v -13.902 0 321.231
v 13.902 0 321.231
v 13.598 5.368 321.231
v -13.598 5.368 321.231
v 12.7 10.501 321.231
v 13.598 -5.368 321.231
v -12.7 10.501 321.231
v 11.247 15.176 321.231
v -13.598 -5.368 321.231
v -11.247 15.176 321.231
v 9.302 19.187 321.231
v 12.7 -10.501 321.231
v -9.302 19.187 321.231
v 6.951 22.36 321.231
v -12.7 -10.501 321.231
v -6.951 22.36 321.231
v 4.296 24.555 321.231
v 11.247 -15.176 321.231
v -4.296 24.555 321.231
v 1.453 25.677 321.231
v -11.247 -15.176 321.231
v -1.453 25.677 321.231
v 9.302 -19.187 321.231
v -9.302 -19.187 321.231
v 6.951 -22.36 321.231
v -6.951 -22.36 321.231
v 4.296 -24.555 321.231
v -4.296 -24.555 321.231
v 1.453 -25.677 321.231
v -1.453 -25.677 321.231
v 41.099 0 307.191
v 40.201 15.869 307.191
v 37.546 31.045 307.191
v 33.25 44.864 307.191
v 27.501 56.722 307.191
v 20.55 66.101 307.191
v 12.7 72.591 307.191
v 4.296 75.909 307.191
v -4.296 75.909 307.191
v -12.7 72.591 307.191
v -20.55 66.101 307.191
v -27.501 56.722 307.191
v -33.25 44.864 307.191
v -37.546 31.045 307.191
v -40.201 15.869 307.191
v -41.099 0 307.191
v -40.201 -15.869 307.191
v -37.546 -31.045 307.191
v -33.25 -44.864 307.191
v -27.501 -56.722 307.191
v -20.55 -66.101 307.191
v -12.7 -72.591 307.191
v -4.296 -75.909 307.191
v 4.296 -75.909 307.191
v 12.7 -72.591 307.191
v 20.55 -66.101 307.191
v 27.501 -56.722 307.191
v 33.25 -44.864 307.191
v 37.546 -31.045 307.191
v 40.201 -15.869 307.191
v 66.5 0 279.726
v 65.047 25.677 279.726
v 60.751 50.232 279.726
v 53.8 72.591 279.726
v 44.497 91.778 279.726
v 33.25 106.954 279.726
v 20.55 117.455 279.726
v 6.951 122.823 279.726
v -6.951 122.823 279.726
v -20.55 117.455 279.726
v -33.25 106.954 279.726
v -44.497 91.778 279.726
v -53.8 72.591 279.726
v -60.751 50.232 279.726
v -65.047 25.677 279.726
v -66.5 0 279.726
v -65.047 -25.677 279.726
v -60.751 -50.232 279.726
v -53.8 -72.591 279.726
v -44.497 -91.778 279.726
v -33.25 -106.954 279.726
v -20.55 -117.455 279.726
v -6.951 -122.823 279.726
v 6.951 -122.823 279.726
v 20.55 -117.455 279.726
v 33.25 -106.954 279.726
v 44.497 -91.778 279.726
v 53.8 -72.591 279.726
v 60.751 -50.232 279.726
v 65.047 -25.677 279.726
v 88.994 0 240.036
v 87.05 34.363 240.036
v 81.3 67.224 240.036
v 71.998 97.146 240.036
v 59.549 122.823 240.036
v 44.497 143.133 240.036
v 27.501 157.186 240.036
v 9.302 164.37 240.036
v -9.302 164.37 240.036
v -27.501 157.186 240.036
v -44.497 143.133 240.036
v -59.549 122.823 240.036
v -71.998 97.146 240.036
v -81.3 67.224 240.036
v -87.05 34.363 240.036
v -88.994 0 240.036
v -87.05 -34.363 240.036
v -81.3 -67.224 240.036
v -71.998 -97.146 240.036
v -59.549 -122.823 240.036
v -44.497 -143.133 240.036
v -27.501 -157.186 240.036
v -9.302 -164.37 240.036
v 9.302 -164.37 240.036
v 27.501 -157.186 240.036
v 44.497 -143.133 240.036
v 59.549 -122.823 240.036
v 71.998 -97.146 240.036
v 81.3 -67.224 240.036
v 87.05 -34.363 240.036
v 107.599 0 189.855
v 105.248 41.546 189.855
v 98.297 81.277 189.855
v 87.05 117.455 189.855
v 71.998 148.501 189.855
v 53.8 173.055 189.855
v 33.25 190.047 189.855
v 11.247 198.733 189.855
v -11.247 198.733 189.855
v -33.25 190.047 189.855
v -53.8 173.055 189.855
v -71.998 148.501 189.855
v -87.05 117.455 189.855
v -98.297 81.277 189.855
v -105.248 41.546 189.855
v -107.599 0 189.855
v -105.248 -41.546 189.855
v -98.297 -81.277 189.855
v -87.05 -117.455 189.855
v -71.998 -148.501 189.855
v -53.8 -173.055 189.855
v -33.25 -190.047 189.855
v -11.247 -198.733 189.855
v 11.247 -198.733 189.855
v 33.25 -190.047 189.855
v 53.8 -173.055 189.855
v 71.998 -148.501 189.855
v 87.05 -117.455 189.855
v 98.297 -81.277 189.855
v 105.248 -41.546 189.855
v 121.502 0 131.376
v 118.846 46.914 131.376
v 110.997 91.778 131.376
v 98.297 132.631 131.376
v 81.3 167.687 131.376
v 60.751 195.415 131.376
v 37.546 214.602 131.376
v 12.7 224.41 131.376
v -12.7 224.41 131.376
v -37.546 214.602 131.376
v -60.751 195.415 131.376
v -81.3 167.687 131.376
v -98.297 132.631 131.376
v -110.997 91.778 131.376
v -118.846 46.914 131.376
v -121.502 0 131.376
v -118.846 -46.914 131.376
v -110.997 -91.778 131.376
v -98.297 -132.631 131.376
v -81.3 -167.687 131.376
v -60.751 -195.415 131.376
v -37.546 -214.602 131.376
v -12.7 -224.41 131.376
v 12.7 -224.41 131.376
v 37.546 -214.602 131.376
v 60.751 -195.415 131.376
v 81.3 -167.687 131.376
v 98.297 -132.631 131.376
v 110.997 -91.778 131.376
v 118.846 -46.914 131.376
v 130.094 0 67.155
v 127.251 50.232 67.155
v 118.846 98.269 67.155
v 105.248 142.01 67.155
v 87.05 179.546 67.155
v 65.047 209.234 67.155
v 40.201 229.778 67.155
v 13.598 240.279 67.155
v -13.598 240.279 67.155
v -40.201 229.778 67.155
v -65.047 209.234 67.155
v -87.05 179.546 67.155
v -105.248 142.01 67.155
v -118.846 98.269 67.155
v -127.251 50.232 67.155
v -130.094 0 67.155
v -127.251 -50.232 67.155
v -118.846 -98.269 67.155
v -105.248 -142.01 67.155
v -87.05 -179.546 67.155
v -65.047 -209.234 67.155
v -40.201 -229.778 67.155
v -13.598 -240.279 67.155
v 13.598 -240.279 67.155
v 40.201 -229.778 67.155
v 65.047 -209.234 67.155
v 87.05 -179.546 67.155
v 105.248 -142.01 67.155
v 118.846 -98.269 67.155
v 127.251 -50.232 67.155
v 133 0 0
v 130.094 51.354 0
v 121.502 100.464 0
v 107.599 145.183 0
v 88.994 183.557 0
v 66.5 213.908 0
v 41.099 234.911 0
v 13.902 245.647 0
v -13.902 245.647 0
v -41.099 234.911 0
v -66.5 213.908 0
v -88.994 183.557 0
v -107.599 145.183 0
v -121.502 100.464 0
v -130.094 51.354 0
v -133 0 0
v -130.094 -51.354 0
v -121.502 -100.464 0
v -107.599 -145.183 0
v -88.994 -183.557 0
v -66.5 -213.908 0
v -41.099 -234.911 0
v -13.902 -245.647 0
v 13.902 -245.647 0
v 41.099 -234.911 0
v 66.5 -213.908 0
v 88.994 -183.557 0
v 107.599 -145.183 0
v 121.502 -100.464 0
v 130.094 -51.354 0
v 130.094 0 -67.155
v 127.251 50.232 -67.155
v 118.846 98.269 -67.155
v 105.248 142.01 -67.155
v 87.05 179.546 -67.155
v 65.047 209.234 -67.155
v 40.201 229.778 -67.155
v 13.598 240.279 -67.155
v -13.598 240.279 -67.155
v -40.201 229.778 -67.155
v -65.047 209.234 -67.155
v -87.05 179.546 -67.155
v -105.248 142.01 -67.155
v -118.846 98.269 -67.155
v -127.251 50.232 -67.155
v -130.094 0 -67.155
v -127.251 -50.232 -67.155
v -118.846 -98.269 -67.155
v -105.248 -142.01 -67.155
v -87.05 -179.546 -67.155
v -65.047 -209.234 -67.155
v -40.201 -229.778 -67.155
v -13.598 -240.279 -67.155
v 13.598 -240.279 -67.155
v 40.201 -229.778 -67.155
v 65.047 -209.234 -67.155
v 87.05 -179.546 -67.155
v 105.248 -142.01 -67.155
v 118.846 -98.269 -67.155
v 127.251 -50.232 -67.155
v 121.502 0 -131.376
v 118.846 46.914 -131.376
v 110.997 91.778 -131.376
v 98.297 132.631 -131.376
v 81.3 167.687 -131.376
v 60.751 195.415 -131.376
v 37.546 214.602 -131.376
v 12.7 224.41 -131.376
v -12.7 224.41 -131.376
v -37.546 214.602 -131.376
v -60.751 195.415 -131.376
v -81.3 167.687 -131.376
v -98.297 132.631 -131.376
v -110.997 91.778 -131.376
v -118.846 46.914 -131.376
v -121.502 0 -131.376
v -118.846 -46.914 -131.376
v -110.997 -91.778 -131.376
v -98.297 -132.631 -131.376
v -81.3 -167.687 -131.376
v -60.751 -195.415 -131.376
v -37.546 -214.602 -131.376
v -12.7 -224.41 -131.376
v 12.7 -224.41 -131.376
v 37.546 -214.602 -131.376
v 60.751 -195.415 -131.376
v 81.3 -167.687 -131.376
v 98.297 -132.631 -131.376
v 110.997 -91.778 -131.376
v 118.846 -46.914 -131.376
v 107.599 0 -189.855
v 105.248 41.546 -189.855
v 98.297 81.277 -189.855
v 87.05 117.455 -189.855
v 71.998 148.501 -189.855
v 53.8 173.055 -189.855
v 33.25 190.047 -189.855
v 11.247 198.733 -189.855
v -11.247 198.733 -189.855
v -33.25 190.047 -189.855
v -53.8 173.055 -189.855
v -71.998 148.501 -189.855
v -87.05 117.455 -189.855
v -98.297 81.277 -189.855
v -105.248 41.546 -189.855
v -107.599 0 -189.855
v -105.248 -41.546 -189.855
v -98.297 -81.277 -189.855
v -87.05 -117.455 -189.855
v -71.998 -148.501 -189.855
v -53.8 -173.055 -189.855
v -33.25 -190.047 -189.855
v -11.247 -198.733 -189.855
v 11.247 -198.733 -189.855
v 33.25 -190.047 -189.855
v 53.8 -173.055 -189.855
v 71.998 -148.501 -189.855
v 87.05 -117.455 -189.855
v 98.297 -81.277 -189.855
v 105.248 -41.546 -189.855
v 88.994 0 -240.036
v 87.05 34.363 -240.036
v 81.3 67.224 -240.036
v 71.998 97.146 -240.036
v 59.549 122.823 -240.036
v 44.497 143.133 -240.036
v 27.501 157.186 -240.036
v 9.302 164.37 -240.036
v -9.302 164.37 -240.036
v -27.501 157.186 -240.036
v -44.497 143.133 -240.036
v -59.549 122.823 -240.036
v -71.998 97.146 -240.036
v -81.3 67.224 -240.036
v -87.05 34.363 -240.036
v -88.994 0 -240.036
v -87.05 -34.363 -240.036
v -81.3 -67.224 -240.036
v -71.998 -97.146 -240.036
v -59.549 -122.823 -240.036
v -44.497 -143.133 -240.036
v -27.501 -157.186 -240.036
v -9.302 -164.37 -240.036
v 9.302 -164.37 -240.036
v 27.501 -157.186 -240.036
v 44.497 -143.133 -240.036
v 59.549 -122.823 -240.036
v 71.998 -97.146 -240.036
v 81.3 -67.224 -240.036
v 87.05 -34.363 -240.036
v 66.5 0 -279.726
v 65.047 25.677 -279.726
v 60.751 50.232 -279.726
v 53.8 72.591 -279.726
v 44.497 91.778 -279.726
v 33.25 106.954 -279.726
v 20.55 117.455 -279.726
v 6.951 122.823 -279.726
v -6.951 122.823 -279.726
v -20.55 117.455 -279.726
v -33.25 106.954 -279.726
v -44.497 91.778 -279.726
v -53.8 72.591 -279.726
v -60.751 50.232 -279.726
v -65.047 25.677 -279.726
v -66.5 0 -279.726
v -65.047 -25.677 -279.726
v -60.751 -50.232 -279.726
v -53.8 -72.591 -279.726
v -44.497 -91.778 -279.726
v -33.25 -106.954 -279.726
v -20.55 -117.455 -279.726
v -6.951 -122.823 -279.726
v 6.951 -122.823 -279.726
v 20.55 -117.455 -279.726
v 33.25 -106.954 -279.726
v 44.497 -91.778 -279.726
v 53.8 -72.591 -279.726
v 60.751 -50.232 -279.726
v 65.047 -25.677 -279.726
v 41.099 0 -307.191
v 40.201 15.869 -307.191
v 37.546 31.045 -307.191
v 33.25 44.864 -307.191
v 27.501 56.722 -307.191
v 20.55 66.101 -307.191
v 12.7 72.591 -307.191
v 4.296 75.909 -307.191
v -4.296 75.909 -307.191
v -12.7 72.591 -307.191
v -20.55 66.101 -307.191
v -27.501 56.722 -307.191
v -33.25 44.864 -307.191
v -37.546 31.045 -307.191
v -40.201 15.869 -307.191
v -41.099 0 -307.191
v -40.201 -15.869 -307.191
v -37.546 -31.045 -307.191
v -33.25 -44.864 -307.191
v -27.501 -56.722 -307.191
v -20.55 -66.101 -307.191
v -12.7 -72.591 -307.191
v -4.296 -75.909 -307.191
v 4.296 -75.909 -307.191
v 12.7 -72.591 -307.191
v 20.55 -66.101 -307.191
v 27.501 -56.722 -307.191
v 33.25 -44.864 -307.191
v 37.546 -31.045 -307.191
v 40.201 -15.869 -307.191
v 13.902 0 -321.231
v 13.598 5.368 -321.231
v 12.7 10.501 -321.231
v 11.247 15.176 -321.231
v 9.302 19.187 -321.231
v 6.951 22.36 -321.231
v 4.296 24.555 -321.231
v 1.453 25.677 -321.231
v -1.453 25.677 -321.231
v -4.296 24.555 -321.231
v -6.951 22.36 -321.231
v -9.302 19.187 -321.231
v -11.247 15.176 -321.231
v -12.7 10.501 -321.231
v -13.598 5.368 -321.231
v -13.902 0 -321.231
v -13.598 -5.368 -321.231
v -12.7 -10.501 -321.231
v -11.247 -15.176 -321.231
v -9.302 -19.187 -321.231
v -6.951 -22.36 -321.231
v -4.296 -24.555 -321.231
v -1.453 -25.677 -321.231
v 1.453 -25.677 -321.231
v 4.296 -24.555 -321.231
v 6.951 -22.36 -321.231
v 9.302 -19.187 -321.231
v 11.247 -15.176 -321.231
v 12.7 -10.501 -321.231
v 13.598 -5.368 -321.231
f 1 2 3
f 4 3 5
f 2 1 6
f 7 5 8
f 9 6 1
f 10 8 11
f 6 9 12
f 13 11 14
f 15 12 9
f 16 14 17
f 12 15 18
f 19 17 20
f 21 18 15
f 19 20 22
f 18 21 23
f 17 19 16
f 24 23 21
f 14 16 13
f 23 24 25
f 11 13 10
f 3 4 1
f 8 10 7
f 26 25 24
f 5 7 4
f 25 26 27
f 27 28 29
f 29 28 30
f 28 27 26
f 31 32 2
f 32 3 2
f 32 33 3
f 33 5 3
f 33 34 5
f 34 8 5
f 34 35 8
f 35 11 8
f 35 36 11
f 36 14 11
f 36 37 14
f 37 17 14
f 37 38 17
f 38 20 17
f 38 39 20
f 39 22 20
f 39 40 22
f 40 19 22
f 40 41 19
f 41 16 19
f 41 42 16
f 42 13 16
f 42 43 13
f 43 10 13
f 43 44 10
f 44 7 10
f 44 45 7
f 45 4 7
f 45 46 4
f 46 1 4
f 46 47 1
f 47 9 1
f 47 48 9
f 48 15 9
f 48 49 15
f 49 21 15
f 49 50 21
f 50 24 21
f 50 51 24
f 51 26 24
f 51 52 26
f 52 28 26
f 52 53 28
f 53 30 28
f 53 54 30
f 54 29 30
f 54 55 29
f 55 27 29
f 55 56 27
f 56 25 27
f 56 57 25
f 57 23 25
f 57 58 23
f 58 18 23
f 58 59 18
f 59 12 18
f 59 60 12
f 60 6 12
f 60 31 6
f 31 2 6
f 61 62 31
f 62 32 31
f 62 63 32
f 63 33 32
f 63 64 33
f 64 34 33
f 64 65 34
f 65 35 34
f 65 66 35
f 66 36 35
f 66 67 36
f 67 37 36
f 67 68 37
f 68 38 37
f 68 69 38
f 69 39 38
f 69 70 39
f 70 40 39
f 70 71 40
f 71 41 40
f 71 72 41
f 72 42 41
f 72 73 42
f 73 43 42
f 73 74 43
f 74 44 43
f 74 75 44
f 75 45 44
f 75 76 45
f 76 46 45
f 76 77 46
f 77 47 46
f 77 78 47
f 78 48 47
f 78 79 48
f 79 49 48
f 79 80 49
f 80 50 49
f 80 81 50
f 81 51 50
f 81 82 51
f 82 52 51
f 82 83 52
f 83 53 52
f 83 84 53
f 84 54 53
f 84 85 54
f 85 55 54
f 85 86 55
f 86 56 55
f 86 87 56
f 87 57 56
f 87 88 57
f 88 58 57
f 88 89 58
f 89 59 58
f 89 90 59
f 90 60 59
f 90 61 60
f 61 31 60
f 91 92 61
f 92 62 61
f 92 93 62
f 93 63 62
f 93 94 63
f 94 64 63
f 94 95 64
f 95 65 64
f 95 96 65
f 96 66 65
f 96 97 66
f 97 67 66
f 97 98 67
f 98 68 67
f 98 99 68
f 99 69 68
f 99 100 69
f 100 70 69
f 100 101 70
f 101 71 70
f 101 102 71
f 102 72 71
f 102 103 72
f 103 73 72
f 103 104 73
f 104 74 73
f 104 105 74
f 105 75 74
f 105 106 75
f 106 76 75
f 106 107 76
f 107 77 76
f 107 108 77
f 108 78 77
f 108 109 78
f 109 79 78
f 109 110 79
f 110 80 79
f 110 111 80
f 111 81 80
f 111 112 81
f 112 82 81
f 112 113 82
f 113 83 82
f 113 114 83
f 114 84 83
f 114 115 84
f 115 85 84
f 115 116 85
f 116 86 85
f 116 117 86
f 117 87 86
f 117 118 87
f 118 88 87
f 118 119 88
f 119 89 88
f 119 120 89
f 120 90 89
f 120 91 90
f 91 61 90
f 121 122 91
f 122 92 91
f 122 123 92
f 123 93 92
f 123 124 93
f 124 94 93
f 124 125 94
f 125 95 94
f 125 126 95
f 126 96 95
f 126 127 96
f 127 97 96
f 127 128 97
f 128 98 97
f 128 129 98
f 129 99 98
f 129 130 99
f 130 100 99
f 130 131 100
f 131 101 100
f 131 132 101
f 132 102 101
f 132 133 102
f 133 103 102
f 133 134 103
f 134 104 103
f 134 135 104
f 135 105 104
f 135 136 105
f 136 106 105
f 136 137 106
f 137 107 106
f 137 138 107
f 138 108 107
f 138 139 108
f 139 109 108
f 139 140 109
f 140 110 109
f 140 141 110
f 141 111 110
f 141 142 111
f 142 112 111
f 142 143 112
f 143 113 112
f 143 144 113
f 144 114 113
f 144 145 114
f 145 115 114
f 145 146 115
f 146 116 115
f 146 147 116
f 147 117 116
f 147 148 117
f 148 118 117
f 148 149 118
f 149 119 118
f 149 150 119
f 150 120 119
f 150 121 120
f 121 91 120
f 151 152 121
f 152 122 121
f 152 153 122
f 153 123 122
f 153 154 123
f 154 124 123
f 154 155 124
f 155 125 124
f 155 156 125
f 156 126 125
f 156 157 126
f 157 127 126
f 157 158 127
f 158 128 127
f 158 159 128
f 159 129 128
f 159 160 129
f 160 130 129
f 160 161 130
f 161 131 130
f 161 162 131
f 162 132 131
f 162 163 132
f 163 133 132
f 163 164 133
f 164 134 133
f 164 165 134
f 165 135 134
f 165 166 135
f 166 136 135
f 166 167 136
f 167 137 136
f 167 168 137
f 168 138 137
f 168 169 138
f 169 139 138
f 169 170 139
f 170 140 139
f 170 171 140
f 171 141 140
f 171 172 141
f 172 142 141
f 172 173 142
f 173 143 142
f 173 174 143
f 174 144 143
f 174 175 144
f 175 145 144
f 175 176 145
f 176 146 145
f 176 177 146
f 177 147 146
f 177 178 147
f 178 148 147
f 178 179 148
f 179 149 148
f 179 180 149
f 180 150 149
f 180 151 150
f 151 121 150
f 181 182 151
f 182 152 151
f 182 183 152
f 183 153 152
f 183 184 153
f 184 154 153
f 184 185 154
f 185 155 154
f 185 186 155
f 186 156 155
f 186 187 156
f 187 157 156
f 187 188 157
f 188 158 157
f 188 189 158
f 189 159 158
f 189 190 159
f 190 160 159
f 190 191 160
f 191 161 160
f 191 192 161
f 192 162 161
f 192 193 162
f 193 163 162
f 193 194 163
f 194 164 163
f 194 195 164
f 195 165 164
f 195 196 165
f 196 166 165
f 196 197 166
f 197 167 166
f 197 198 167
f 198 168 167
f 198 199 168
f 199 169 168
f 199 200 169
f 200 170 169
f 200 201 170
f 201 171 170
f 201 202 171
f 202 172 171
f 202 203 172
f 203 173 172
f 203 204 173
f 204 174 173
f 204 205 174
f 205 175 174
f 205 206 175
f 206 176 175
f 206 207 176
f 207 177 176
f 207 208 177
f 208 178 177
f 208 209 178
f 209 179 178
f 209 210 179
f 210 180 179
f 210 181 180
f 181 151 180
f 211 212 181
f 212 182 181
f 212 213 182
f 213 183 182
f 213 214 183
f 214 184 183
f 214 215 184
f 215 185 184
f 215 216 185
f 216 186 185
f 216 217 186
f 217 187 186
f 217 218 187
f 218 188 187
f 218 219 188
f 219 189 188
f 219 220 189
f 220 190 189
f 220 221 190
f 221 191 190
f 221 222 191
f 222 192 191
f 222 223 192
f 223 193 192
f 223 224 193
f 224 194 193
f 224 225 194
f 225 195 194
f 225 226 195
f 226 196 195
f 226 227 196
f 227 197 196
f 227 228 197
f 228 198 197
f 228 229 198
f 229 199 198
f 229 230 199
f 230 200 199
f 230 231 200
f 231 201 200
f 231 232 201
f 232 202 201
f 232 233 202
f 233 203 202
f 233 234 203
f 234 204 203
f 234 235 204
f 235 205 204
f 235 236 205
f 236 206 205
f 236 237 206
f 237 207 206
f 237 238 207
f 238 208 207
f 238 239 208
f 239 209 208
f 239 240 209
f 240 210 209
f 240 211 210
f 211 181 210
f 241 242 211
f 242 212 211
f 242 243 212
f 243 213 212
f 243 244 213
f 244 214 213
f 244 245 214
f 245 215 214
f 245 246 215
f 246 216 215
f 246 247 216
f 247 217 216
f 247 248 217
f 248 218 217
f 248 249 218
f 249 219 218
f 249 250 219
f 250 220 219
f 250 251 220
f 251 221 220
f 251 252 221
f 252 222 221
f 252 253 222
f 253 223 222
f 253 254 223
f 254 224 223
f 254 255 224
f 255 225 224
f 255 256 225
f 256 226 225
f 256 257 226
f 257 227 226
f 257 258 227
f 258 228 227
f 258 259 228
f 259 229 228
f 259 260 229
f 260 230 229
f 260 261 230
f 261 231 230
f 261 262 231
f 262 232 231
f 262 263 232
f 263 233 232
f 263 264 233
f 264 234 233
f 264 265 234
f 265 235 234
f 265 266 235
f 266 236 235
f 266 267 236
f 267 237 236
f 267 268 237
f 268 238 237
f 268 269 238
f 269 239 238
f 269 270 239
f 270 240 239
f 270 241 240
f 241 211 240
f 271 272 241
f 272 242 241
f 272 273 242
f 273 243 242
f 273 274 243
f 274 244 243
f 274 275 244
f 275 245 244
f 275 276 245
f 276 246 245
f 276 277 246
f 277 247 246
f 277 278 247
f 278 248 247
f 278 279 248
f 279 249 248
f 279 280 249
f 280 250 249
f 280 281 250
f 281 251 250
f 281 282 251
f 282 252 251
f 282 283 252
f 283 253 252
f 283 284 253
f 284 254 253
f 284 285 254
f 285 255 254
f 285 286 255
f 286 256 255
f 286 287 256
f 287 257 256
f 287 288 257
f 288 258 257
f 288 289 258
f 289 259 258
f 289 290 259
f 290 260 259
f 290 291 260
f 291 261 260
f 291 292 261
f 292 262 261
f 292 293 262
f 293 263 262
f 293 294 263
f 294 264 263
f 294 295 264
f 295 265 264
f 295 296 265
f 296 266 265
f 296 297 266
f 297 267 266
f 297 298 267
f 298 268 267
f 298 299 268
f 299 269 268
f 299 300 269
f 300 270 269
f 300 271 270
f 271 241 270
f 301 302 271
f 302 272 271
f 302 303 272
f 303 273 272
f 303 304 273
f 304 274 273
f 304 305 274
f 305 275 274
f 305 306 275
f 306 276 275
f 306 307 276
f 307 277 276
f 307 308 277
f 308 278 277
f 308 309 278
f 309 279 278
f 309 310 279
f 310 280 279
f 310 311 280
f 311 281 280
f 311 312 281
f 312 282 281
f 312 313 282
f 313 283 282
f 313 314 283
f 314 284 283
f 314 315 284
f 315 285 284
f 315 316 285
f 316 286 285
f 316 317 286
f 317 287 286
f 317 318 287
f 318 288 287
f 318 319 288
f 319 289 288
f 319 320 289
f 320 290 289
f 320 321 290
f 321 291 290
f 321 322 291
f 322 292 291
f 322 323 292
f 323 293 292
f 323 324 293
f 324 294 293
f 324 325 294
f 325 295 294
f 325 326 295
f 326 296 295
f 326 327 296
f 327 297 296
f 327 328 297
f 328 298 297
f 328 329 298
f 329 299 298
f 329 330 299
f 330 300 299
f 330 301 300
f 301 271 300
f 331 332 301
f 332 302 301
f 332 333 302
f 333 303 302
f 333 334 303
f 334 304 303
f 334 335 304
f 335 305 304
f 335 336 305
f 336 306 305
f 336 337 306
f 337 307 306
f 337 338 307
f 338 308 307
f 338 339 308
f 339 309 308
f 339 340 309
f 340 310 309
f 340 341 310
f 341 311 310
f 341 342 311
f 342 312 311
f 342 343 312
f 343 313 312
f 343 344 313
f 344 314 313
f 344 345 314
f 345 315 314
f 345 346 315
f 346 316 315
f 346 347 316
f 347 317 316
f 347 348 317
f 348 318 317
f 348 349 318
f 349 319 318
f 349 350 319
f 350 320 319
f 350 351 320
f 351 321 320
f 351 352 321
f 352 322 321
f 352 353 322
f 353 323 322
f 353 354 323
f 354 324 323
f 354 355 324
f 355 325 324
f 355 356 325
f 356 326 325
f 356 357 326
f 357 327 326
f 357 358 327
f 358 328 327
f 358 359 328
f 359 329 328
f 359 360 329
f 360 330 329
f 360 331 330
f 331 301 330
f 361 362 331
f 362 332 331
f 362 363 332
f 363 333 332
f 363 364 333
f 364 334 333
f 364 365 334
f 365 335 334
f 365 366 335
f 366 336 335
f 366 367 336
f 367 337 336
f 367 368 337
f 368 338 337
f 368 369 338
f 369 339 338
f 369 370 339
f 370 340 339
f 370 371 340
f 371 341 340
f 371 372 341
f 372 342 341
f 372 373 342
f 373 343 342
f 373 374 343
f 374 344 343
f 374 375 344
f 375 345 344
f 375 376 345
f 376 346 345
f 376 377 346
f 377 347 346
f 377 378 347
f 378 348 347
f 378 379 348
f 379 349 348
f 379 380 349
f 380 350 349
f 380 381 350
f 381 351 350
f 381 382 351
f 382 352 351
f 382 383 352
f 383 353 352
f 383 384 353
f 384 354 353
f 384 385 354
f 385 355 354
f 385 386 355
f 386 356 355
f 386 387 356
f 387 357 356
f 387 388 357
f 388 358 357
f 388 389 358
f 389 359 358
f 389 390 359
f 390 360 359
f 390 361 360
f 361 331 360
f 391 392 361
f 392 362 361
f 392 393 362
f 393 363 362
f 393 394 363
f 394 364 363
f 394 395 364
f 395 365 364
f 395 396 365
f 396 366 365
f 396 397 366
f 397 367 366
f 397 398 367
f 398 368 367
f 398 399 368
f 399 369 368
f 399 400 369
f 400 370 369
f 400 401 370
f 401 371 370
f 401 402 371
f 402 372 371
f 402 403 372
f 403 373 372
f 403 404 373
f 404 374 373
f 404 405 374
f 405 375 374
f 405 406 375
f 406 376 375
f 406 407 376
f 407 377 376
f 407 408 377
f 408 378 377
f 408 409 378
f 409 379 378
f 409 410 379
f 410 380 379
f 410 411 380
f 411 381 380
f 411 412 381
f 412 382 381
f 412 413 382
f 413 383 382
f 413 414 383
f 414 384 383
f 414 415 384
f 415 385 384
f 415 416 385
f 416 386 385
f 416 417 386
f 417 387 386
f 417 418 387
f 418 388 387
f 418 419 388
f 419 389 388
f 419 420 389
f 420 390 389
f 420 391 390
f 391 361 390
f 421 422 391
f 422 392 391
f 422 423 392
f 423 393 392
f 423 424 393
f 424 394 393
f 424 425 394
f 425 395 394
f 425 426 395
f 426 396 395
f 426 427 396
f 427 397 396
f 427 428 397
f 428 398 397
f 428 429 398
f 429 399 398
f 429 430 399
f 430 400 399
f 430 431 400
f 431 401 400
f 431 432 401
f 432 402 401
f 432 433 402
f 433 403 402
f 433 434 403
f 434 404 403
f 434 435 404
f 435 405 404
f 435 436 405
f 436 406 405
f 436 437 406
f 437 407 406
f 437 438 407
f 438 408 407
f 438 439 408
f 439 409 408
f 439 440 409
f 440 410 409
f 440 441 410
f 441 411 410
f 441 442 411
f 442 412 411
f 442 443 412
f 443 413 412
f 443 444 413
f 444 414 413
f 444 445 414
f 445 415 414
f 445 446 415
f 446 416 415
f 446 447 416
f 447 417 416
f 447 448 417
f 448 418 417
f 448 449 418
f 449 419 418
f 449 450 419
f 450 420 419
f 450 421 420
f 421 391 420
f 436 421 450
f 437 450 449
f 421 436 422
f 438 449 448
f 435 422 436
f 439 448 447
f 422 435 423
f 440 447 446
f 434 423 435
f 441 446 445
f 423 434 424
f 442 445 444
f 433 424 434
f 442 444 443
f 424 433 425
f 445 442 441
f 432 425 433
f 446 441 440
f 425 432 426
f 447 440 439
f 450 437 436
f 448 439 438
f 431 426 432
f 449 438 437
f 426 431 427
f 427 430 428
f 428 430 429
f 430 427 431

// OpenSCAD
// Generated by SolidPython 1.0.1 on 2020-07-29 00:46:47


scale(v = [7, 13, 17]) {
	sphere(r = 19);
}
/***********************************************
*********      SolidPython code:      **********
************************************************
 
# import packages: SolidPython
from solid import *
from solid.utils import *
from itertools import chain, combinations, permutations


class Resize:

    def __init__(self, scad_file):
        self.scad_file = scad_file
        #self.scad_file = import_scad(scad_file)
        # cone/cylinder param:
        self.r1 = 0
        self.r2 = 0
        self.h = 0
        # rectangular prism param:
        self.w = 0
        self.l = 0
        # ellipse param:
        self.r = 0

    # import OpenScad code (file name corresponds to shape)


    # classify shape + parameters
    def assign(self, param1, param2, param3):
        if self.scad_file == 'cone.scad':
            self.r1 = param1
            self.r2 = param2
            self.h = param3
        elif self.scad_file == 'cylinder.scad':
            self.r1 = param1
            self.r2 = param2
            self.h = param3
        elif self.scad_file == 'rectangularPrism.scad':
            self.h = param1
            self.l = param2
            self.w = param3
        else:
            self.r = param1
            self.h = param2

    # resize parameters
    def iterate(self):
        x = range(3, 20, 2)
        i = 1
        if self.scad_file == 'cone.scad':
            tempList = list(permutations(x, 2))
            for temp in tempList:
                param1 = temp[0]
                param2 = temp[1]
                filepath = 'produced_scad_files/' + 'cone' + str(param1) + '_' + str(param2) + '_' + '.scad'
                scad_render_to_file(cylinder(h=param1, r1=param2, r2=0), filepath)

        elif self.scad_file == 'cylinder.scad':
            tempList = list(permutations(x, 3))
            for temp in tempList:
                param1 = temp[0]
                param2 = temp[1]
                filepath = 'produced_scad_files/' + 'cylinder' + str(param1) + '_' + str(param2) + '_' + '.scad'
                scad_render_to_file(cylinder(h=param1, r1=param2, r2=param2), filepath)

        elif self.scad_file == 'rectangularPrism.scad':
            tempList = list(permutations(x, 3))
            for temp in tempList:
                param1 = temp[0]
                param2 = temp[1]
                param3 = temp[2]
                filepath = 'produced_scad_files/' + 'rectangularPrism' + str(param1) + '_' + str(param2) + '_' + str(
                    param3) + '.scad'
                scad_render_to_file(cube(size=(param1, param2, param3)), filepath)

        elif self.scad_file == 'ellipse.scad':
            tempList = list(permutations(x, 4))
            for temp in tempList:
                param1 = temp[0]
                param2 = temp[1]
                param3 = temp[2]
                param4 = temp[3]
                filepath = 'produced_scad_files/' + 'ellipse' + str(param1) + '_' + str(param2) + '_' + str(param3) + '_' + str(param4) + '.scad'
                scad_render_to_file(scale([param1, param2, param3])(sphere(r=param4)), filepath)

    def render_to_scadfile(self):
        scad_render_to_file(scad, 'example.scad') 
 
************************************************/
